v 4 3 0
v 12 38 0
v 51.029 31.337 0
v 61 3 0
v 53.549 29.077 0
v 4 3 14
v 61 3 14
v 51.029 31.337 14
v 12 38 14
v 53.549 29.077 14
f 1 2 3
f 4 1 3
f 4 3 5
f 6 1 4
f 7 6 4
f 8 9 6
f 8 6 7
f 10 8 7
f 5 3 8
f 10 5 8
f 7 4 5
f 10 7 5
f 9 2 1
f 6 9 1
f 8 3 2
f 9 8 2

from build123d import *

# Parameters (mm, degrees)
BOSS_EXTRUDE1_DEPTH = 14
CHAMFER1_SIZE       = 2


with BuildPart() as part:
    # Sketch1 → Boss-Extrude1 (new body)
    with BuildSketch(Plane.XY):
        Polygon((4, 3), (61, 3), (53, 31), (12, 38), align=None)
    extrude(amount=BOSS_EXTRUDE1_DEPTH)

    # Chamfer1
    chamfer1_edges = [part.edges().sort_by_distance(p)[0] for p in [
        (53, 31, 7),
    ]]
    chamfer(chamfer1_edges, length=CHAMFER1_SIZE)


solid = part.part
